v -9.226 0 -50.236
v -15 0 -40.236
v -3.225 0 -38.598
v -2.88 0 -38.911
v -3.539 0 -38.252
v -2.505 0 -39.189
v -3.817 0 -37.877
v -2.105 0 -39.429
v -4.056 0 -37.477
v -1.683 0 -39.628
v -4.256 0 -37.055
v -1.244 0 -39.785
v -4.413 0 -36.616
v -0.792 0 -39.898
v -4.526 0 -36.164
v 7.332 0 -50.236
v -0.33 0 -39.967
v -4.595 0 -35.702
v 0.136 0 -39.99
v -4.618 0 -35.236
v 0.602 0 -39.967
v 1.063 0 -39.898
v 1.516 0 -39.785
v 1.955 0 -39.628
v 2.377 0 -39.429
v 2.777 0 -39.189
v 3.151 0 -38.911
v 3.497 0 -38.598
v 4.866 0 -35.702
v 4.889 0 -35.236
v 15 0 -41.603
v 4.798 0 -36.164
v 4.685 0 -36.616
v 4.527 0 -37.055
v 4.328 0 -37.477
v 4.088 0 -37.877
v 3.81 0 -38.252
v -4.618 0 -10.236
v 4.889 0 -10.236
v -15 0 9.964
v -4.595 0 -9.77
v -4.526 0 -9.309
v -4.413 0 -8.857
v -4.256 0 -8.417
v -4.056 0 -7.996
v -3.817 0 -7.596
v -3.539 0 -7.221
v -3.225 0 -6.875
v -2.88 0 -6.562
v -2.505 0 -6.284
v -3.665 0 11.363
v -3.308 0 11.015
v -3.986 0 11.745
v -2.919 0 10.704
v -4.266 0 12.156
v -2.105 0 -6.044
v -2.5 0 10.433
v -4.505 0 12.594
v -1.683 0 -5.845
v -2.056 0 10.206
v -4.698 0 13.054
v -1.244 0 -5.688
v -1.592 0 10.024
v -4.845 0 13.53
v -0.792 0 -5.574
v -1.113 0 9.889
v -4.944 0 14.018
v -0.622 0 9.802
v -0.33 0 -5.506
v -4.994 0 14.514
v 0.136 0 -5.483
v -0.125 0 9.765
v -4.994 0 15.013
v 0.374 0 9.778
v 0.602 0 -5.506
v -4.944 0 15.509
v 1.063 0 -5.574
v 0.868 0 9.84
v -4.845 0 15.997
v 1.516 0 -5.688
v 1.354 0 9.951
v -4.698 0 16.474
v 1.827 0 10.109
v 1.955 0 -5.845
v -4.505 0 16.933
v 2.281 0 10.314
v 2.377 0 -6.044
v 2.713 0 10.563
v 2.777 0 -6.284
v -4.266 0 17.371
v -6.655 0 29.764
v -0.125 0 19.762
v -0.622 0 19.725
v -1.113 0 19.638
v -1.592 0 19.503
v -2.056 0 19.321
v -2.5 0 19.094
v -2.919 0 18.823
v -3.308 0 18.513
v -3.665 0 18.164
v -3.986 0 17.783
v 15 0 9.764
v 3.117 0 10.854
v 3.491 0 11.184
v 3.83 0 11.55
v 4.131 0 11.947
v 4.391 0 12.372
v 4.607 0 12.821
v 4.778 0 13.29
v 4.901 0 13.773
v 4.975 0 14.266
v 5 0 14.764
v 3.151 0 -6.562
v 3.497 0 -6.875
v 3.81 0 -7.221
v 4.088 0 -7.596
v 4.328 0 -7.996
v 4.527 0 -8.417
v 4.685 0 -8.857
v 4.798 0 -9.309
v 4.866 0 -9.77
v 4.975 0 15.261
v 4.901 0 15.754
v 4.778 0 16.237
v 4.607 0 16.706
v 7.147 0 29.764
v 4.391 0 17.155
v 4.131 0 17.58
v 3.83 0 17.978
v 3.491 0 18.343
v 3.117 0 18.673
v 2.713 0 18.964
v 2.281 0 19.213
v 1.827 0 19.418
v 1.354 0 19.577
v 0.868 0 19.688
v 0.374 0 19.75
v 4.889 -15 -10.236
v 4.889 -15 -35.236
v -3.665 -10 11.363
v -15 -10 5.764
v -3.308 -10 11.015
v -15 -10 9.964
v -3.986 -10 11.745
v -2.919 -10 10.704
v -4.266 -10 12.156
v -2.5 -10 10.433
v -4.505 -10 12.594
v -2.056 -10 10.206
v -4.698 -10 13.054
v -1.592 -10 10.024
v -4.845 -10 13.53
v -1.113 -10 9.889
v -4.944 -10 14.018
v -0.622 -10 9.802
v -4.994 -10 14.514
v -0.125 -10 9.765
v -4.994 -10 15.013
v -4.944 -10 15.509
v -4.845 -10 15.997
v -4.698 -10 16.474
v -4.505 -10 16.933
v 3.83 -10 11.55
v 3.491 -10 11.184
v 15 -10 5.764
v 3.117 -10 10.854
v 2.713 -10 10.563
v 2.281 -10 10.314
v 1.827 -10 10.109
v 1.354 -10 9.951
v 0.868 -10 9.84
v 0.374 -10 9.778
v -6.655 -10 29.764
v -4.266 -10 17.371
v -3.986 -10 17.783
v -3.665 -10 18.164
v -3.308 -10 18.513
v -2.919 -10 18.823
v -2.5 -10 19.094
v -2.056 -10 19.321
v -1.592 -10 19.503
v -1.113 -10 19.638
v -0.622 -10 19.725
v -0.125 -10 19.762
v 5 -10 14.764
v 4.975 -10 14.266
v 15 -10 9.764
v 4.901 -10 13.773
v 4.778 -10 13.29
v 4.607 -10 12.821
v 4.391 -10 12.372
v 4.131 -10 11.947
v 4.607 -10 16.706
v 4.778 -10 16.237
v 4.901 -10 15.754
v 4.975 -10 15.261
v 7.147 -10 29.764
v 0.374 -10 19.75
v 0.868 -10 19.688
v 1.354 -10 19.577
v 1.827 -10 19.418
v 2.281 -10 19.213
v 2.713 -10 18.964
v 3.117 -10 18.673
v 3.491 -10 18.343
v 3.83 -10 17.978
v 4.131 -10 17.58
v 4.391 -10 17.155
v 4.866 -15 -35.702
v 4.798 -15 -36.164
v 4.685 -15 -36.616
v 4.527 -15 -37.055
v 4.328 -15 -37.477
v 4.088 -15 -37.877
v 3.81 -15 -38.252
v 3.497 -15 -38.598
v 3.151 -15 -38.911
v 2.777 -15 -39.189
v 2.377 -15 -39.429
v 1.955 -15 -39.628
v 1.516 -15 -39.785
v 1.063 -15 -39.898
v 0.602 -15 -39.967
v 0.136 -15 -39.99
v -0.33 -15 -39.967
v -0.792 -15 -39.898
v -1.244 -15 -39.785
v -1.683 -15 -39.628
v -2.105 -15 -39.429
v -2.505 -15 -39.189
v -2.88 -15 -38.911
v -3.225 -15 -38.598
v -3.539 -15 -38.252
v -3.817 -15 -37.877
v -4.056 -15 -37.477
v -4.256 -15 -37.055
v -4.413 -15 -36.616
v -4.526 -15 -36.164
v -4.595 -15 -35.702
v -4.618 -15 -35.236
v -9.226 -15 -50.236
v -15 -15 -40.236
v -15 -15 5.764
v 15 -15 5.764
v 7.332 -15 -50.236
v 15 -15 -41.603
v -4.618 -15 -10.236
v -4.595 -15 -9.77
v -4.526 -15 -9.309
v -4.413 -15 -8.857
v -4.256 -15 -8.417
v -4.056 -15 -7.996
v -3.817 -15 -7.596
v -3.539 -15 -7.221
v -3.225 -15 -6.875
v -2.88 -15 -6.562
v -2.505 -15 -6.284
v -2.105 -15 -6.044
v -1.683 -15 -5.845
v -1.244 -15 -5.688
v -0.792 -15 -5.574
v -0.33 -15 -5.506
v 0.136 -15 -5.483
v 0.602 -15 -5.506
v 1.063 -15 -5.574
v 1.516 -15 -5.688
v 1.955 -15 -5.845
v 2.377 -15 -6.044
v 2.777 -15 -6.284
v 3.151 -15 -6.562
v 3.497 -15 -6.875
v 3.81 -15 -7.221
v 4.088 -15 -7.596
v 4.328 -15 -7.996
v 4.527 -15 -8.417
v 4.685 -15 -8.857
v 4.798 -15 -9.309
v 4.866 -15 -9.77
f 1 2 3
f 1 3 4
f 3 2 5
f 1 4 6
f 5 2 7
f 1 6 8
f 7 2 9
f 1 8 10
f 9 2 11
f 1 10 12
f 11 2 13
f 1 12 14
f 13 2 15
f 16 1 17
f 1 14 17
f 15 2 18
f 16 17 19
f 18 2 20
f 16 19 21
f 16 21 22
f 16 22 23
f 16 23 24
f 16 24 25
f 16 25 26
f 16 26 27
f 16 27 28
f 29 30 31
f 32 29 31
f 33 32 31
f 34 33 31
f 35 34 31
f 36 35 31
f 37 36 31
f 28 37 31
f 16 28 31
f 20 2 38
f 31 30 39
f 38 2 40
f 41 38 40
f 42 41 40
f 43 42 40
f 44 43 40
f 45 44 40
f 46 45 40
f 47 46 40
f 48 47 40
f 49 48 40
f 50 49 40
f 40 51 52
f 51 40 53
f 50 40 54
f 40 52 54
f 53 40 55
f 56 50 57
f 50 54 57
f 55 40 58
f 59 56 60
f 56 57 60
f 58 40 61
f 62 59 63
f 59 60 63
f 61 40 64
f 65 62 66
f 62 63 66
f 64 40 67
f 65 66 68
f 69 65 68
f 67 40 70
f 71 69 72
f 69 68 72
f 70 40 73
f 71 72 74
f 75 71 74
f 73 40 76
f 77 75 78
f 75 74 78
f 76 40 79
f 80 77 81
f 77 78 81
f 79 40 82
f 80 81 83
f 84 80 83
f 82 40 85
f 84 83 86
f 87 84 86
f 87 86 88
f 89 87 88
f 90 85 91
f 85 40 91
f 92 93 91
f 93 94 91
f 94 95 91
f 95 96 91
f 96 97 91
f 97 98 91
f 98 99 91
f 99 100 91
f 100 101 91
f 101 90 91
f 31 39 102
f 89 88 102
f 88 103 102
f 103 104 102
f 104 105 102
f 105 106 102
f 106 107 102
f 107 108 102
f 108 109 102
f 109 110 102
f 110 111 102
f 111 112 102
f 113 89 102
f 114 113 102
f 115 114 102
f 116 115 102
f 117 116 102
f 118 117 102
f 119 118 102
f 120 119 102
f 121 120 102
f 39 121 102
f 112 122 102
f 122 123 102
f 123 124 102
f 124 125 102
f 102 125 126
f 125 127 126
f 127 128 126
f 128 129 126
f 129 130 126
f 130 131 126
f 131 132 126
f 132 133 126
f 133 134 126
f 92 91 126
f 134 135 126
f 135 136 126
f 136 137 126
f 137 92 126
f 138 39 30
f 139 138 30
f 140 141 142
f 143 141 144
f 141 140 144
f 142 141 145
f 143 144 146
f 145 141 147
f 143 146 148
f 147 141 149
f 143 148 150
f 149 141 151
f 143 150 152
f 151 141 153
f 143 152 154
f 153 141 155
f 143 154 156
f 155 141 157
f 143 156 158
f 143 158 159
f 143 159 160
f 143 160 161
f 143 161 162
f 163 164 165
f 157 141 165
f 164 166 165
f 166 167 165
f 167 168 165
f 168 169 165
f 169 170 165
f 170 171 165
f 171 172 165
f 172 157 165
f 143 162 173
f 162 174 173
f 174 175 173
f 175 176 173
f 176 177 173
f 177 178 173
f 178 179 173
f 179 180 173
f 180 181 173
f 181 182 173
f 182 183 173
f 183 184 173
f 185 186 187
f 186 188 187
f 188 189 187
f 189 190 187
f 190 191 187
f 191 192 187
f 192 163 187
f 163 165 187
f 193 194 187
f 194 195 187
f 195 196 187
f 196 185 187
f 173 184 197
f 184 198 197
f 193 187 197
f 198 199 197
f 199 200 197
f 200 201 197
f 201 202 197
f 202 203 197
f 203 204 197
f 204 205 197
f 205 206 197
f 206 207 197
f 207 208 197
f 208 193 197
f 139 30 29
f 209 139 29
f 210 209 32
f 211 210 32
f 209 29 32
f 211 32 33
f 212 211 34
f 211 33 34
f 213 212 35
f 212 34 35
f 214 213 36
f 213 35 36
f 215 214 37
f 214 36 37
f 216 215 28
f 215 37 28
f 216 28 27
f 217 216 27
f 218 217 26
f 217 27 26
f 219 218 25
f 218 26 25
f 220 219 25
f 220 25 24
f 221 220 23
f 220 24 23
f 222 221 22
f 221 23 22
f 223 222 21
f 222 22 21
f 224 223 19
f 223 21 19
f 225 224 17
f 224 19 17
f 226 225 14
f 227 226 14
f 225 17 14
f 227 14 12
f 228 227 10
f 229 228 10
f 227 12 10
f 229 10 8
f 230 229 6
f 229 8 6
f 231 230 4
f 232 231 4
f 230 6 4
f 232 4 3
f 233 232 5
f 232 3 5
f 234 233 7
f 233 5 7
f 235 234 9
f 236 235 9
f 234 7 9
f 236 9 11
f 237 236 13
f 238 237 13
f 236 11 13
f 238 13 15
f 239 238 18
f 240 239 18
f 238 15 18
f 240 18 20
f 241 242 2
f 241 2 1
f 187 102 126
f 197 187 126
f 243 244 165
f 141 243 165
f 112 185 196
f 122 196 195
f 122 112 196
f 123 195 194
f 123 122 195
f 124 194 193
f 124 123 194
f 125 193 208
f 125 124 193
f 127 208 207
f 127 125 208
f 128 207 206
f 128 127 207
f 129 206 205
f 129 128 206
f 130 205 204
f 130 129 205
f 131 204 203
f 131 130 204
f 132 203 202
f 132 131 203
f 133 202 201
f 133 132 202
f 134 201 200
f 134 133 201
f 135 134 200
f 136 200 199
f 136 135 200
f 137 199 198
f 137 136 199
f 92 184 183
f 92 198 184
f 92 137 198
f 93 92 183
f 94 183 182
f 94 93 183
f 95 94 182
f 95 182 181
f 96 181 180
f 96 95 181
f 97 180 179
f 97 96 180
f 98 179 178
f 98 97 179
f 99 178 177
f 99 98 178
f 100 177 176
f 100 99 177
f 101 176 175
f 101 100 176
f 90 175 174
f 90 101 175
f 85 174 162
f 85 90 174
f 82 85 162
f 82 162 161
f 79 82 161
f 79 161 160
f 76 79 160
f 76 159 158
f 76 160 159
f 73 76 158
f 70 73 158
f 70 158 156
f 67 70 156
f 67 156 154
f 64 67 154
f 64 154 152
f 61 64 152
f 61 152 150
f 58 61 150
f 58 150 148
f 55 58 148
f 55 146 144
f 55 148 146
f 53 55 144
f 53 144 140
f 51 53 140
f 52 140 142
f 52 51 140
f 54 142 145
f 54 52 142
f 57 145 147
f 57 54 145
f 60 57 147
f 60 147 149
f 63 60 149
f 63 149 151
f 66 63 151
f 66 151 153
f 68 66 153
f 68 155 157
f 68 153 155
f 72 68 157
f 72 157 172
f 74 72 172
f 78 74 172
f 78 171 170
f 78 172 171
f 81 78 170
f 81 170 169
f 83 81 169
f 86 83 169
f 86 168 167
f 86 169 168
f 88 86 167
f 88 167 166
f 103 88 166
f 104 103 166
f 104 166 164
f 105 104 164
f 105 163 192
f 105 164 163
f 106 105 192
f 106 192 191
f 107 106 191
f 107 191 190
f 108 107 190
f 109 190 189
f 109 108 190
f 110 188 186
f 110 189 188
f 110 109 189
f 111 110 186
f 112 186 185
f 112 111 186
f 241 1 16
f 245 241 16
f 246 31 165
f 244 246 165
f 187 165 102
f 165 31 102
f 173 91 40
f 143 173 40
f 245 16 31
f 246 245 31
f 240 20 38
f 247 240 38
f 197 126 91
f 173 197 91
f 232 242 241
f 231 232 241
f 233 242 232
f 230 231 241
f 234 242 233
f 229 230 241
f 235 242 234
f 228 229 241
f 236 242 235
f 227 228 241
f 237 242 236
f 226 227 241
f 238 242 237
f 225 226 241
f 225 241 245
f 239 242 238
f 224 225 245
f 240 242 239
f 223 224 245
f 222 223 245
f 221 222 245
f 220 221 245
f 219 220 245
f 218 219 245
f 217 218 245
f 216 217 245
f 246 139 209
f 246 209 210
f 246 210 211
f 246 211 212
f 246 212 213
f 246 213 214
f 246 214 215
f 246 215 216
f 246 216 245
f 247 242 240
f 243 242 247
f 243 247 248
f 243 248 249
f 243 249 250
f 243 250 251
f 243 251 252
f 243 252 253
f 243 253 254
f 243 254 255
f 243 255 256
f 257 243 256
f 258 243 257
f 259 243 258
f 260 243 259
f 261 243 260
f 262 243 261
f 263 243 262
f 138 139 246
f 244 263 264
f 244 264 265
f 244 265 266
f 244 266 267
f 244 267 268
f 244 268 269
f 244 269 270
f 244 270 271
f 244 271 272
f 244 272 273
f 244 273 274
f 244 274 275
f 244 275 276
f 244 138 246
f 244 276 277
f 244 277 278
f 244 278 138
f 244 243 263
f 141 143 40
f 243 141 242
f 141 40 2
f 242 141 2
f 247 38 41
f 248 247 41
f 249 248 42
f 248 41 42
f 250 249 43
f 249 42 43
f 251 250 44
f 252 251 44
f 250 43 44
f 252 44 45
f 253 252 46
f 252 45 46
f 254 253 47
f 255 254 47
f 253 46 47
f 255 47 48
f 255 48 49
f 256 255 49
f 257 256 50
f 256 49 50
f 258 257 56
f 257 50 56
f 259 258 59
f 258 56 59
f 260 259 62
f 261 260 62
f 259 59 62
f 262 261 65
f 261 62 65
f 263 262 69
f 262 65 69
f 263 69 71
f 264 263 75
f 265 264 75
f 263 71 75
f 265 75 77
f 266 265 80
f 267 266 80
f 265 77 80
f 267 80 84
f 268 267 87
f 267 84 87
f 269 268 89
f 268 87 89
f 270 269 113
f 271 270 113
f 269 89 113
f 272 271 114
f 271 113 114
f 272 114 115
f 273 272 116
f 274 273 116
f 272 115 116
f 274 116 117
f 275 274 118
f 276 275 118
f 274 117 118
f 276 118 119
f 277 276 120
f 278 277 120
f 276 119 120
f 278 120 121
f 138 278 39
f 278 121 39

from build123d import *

# Parameters (mm, degrees)
F0_R     = 5
F1_DEPTH = 15
F3_DEPTH = 25


with BuildPart() as f1:
    # F0 (on Front) → F1 (new body)
    with BuildSketch(Plane.XZ):
        Polygon((-9.226497, -50.236377), (7.332118, -50.236377), (15, -41.6029), (15, 9.763623), (7.147167, 29.763623), (-6.655383, 29.763623), (-15, 9.963766), (-15, -40.236377), align=None)
        with BuildLine():
            Line((-4.617641, -35.236377), (-4.617641, -10.236377))
            ThreePointArc((-4.617641, -10.236377), (0.135772, -5.482964), (4.889185, -10.236377))
            Line((4.889185, -10.236377), (4.889185, -35.236377))
            ThreePointArc((4.889185, -35.236377), (0.135772, -39.98979), (-4.617641, -35.236377))
        make_face(mode=Mode.SUBTRACT)
        with Locations((0, 14.763623)):
            Circle(F0_R, mode=Mode.SUBTRACT)
    extrude(amount=F1_DEPTH)

    # F2 (on Right) → F3 (cut, symmetric)
    with BuildSketch(Plane.YZ):
        Polygon((-15, 9.763623), (-15, 5.763623), (-10, 5.763623), (-10, 39.44074), (-15, 39.44074), align=None)
    extrude(amount=F3_DEPTH, both=True, mode=Mode.SUBTRACT)


solid = f1.part
